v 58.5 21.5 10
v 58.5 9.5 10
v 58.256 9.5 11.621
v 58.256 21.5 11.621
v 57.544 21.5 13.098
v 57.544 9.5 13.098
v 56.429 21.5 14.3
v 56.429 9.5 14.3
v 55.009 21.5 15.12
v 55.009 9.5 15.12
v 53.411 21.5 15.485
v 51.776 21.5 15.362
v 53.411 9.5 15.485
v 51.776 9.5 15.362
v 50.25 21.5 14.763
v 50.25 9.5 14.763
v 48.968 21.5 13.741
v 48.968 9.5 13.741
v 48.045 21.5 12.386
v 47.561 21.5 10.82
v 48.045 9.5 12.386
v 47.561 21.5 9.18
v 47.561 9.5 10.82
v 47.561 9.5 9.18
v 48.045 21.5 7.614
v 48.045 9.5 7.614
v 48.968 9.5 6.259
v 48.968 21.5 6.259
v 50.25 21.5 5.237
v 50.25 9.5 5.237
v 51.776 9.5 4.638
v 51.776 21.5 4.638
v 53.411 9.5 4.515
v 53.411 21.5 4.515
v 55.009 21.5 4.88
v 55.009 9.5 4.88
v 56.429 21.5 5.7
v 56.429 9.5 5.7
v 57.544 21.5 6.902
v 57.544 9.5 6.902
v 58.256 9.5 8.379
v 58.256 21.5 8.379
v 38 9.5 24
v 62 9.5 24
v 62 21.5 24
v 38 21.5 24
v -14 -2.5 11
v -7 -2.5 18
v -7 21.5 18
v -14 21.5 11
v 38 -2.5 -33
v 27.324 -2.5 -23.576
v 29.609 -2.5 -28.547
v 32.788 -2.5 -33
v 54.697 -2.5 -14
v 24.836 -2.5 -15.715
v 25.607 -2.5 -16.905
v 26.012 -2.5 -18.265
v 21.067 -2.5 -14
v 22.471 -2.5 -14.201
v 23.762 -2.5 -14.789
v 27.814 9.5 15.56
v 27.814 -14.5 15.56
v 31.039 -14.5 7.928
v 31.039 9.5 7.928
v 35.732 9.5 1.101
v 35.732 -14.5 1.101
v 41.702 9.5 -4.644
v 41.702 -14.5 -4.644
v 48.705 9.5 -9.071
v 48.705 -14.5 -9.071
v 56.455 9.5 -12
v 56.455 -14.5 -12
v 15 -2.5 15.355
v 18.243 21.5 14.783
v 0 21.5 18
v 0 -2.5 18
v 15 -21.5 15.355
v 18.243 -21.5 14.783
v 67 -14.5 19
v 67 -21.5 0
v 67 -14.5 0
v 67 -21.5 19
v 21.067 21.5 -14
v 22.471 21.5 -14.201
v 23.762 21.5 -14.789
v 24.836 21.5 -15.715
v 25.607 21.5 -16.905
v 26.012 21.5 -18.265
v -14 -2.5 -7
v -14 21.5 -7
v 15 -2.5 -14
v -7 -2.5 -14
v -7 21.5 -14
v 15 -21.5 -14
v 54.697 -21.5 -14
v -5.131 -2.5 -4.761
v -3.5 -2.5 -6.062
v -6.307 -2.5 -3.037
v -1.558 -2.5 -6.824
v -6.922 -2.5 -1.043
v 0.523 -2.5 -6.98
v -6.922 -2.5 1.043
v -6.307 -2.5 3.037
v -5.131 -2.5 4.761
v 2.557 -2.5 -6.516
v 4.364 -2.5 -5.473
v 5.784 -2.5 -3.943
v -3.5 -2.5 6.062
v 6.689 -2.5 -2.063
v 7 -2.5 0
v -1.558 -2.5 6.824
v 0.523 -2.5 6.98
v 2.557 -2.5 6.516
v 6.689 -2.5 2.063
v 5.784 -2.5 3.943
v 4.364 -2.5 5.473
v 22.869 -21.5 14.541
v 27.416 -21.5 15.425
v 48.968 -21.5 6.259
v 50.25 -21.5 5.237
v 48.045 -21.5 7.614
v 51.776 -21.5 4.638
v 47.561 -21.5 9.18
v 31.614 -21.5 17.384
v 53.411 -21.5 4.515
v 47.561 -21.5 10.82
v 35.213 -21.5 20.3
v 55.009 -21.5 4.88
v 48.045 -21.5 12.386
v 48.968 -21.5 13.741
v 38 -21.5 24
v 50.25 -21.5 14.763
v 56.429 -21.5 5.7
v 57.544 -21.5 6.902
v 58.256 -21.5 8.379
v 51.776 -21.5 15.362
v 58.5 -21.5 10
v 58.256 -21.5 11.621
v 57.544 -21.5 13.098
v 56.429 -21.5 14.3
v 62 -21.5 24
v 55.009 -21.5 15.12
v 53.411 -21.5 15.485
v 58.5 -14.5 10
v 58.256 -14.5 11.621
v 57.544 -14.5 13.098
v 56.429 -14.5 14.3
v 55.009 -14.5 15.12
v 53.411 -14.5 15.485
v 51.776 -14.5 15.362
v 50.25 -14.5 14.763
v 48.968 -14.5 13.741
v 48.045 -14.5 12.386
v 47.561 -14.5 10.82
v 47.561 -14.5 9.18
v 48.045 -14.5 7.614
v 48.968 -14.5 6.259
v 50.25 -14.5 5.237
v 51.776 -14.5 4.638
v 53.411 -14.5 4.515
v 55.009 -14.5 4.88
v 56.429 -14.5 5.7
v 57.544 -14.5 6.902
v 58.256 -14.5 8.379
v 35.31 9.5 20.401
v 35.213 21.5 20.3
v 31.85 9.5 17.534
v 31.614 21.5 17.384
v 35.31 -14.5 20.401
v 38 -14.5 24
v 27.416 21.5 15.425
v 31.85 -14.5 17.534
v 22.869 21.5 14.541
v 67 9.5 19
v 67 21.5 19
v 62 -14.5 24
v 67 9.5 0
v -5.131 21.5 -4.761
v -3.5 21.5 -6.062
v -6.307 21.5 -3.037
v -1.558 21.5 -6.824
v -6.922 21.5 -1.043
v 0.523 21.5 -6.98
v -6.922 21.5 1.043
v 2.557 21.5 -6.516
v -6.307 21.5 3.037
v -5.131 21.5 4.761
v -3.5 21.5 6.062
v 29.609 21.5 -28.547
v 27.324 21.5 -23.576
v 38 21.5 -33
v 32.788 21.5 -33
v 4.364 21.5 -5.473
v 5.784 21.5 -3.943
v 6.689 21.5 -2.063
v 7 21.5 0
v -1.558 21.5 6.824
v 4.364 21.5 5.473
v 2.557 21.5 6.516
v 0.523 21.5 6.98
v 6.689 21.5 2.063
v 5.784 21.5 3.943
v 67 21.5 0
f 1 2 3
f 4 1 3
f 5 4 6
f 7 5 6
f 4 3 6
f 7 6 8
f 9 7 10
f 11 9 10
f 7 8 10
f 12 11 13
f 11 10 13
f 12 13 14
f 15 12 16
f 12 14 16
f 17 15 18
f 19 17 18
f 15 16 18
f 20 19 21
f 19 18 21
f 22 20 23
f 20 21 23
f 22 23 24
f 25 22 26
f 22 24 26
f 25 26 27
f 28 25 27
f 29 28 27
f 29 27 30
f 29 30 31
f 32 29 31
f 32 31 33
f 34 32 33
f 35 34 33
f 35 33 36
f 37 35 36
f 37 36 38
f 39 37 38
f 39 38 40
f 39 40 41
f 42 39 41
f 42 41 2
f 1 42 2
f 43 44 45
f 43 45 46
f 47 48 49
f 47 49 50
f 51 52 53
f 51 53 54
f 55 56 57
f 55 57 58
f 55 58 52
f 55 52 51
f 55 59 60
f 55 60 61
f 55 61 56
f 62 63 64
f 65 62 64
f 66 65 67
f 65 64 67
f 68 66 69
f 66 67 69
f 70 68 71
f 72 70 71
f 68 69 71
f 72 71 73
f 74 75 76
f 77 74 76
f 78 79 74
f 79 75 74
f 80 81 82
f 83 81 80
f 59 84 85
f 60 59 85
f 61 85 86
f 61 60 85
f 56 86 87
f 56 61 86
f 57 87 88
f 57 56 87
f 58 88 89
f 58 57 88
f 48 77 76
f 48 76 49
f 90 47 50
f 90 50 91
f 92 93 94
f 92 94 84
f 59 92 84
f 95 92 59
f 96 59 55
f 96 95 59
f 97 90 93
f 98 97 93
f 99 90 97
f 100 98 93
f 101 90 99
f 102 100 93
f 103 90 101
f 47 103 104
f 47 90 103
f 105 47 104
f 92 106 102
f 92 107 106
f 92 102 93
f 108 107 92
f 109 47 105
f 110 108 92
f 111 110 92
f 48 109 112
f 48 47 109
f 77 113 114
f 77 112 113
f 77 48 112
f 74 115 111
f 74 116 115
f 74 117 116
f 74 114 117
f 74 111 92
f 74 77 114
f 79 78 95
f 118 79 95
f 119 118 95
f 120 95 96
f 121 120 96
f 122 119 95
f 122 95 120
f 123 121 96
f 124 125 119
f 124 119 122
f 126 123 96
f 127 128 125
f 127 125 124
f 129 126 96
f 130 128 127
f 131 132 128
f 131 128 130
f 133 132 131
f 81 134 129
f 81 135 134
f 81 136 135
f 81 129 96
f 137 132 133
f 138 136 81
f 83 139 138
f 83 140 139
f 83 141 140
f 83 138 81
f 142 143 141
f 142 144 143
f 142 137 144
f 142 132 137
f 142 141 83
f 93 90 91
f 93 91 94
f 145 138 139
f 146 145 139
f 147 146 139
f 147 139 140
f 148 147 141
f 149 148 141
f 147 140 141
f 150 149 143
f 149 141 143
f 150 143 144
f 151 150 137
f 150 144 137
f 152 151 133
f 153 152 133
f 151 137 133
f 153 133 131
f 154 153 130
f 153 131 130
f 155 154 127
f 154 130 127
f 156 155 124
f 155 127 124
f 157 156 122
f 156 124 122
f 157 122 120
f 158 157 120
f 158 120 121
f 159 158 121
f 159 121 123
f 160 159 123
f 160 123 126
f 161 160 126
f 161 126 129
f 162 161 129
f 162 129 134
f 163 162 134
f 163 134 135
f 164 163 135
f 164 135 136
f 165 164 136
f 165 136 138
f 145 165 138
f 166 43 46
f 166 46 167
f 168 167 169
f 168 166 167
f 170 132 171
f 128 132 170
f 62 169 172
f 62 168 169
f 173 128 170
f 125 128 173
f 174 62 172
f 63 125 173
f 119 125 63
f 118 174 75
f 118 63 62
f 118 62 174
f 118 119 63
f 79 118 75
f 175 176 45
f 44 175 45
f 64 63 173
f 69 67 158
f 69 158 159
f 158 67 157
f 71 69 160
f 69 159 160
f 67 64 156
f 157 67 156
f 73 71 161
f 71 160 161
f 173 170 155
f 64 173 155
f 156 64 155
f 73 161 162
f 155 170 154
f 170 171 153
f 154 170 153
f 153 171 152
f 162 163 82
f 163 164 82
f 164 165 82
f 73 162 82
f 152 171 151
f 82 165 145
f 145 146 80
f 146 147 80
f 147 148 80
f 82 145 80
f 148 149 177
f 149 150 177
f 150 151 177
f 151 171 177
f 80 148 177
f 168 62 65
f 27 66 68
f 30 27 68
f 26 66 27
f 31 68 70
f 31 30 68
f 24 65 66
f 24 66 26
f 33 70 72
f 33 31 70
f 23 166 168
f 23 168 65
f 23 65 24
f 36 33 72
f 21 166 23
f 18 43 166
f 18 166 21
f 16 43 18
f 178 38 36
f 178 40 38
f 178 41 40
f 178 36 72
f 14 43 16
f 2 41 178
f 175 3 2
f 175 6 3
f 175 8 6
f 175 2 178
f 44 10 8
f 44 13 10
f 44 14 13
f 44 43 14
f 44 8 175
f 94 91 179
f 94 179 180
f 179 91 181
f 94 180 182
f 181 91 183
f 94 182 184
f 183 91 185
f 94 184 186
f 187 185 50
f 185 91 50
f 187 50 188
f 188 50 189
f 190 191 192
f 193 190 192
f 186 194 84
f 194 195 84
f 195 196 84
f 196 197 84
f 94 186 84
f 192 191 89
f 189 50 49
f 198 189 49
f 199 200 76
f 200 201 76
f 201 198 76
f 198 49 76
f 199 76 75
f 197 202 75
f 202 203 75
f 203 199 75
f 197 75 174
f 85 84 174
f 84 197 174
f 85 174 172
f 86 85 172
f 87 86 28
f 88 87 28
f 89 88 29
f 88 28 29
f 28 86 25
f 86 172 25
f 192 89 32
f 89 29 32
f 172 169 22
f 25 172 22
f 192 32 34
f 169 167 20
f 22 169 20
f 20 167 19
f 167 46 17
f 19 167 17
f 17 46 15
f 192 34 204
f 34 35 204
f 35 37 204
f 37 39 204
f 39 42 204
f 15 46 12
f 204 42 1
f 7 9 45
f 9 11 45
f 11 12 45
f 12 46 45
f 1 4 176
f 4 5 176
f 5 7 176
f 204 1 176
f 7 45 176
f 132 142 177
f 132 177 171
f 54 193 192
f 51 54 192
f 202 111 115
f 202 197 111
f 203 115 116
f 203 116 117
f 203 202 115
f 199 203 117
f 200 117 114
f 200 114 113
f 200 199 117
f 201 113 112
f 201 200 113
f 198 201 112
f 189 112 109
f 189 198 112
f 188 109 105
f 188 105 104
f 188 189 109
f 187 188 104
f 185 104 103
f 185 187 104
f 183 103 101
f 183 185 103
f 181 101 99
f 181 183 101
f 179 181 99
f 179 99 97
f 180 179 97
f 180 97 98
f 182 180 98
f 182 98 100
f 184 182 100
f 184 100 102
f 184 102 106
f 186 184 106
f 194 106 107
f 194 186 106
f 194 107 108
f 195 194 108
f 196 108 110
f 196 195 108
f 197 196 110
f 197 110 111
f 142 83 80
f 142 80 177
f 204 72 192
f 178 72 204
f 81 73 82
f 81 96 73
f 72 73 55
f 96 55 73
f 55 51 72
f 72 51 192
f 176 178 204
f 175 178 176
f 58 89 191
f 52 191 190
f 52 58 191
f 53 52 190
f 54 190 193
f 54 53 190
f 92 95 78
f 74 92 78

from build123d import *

# Parameters (mm, degrees)
F0_R     = 7
F1_DEPTH = 21.5
F2_R     = 5.5
F3_DEPTH = 43.001
F2_R_2   = 7
F4_DEPTH = 19
F6_R     = 5.5
F7_DEPTH = 12


with BuildPart() as f1:
    # F0 (on Front) → F1 (new body, symmetric)
    with BuildSketch(Plane.XZ):
        with BuildLine():
            Line((-14, 11), (-14, -7))
            Line((-14, -7), (-7, -14))
            Line((-7, -14), (21.0666262554, -14))
            ThreePointArc((21.0666262554, -14), (24.3318620364, -15.2134137678), (26.0122649968, -18.2647058824))
            ThreePointArc((26.0122649968, -18.2647058824), (28.3490951999, -26.115672061), (32.7880673968, -33))
            Line((32.7880673968, -33), (38, -33))
            Line((38, -33), (67, 0))
            Line((67, 0), (67, 19))
            Line((67, 19), (62, 24))
            Line((62, 24), (38, 24))
            ThreePointArc((38, 24), (29.5749729609, 16.2760691513), (18.2430849879, 14.7832519053))
            Line((18.2430849879, 14.7832519053), (0, 18))
            Line((0, 18), (-7, 18))
            Line((-7, 18), (-14, 11))
        make_face()
        Circle(F0_R, mode=Mode.SUBTRACT)
    extrude(amount=F1_DEPTH, both=True)

    # F2 (on face) → F3 (cut, through all)
    with BuildSketch(Plane.XZ.offset(21.5)):
        with Locations((53, 10)):
            Circle(F2_R)
    extrude(amount=-F3_DEPTH, mode=Mode.SUBTRACT)

    # F2 (on face) → F4 (cut)
    with BuildSketch(Plane.XZ.offset(21.5)):
        Polygon((15, -14), (15, 15.3550952894), (0, 18), (-7, 18), (-14, 11), (-14, -7), (-7, -14), align=None)
        Circle(F2_R_2, mode=Mode.SUBTRACT)
        with BuildLine():
            Line((54.696969697, -14), (21.0666262554, -14))
            ThreePointArc((21.0666262554, -14), (24.3318620364, -15.2134137678), (26.0122649968, -18.2647058824))
            ThreePointArc((26.0122649968, -18.2647058824), (28.3490951999, -26.115672061), (32.7880673968, -33))
            Line((32.7880673968, -33), (38, -33))
            Line((38, -33), (54.696969697, -14))
        make_face()
    extrude(amount=-F4_DEPTH, mode=Mode.SUBTRACT)

    # F6 (on offset) → F7 (cut, symmetric)
    with BuildSketch(Plane.XZ.offset(2.5)):
        with BuildLine():
            Line((67, 19), (62, 24))
            Line((62, 24), (38, 24))
            ThreePointArc((38, 24), (33.6653533969, 18.864697991), (27.8141459246, 15.5595718187))
            ThreePointArc((27.8141459246, 15.5595718187), (38.5714357733, -1.9228537457), (56.4545454545, -12))
            Line((56.4545454545, -12), (67, 0))
            Line((67, 0), (67, 19))
        make_face()
        with Locations((53, 10)):
            Circle(F6_R, mode=Mode.SUBTRACT)
    extrude(amount=F7_DEPTH, both=True, mode=Mode.SUBTRACT)


solid = f1.part
